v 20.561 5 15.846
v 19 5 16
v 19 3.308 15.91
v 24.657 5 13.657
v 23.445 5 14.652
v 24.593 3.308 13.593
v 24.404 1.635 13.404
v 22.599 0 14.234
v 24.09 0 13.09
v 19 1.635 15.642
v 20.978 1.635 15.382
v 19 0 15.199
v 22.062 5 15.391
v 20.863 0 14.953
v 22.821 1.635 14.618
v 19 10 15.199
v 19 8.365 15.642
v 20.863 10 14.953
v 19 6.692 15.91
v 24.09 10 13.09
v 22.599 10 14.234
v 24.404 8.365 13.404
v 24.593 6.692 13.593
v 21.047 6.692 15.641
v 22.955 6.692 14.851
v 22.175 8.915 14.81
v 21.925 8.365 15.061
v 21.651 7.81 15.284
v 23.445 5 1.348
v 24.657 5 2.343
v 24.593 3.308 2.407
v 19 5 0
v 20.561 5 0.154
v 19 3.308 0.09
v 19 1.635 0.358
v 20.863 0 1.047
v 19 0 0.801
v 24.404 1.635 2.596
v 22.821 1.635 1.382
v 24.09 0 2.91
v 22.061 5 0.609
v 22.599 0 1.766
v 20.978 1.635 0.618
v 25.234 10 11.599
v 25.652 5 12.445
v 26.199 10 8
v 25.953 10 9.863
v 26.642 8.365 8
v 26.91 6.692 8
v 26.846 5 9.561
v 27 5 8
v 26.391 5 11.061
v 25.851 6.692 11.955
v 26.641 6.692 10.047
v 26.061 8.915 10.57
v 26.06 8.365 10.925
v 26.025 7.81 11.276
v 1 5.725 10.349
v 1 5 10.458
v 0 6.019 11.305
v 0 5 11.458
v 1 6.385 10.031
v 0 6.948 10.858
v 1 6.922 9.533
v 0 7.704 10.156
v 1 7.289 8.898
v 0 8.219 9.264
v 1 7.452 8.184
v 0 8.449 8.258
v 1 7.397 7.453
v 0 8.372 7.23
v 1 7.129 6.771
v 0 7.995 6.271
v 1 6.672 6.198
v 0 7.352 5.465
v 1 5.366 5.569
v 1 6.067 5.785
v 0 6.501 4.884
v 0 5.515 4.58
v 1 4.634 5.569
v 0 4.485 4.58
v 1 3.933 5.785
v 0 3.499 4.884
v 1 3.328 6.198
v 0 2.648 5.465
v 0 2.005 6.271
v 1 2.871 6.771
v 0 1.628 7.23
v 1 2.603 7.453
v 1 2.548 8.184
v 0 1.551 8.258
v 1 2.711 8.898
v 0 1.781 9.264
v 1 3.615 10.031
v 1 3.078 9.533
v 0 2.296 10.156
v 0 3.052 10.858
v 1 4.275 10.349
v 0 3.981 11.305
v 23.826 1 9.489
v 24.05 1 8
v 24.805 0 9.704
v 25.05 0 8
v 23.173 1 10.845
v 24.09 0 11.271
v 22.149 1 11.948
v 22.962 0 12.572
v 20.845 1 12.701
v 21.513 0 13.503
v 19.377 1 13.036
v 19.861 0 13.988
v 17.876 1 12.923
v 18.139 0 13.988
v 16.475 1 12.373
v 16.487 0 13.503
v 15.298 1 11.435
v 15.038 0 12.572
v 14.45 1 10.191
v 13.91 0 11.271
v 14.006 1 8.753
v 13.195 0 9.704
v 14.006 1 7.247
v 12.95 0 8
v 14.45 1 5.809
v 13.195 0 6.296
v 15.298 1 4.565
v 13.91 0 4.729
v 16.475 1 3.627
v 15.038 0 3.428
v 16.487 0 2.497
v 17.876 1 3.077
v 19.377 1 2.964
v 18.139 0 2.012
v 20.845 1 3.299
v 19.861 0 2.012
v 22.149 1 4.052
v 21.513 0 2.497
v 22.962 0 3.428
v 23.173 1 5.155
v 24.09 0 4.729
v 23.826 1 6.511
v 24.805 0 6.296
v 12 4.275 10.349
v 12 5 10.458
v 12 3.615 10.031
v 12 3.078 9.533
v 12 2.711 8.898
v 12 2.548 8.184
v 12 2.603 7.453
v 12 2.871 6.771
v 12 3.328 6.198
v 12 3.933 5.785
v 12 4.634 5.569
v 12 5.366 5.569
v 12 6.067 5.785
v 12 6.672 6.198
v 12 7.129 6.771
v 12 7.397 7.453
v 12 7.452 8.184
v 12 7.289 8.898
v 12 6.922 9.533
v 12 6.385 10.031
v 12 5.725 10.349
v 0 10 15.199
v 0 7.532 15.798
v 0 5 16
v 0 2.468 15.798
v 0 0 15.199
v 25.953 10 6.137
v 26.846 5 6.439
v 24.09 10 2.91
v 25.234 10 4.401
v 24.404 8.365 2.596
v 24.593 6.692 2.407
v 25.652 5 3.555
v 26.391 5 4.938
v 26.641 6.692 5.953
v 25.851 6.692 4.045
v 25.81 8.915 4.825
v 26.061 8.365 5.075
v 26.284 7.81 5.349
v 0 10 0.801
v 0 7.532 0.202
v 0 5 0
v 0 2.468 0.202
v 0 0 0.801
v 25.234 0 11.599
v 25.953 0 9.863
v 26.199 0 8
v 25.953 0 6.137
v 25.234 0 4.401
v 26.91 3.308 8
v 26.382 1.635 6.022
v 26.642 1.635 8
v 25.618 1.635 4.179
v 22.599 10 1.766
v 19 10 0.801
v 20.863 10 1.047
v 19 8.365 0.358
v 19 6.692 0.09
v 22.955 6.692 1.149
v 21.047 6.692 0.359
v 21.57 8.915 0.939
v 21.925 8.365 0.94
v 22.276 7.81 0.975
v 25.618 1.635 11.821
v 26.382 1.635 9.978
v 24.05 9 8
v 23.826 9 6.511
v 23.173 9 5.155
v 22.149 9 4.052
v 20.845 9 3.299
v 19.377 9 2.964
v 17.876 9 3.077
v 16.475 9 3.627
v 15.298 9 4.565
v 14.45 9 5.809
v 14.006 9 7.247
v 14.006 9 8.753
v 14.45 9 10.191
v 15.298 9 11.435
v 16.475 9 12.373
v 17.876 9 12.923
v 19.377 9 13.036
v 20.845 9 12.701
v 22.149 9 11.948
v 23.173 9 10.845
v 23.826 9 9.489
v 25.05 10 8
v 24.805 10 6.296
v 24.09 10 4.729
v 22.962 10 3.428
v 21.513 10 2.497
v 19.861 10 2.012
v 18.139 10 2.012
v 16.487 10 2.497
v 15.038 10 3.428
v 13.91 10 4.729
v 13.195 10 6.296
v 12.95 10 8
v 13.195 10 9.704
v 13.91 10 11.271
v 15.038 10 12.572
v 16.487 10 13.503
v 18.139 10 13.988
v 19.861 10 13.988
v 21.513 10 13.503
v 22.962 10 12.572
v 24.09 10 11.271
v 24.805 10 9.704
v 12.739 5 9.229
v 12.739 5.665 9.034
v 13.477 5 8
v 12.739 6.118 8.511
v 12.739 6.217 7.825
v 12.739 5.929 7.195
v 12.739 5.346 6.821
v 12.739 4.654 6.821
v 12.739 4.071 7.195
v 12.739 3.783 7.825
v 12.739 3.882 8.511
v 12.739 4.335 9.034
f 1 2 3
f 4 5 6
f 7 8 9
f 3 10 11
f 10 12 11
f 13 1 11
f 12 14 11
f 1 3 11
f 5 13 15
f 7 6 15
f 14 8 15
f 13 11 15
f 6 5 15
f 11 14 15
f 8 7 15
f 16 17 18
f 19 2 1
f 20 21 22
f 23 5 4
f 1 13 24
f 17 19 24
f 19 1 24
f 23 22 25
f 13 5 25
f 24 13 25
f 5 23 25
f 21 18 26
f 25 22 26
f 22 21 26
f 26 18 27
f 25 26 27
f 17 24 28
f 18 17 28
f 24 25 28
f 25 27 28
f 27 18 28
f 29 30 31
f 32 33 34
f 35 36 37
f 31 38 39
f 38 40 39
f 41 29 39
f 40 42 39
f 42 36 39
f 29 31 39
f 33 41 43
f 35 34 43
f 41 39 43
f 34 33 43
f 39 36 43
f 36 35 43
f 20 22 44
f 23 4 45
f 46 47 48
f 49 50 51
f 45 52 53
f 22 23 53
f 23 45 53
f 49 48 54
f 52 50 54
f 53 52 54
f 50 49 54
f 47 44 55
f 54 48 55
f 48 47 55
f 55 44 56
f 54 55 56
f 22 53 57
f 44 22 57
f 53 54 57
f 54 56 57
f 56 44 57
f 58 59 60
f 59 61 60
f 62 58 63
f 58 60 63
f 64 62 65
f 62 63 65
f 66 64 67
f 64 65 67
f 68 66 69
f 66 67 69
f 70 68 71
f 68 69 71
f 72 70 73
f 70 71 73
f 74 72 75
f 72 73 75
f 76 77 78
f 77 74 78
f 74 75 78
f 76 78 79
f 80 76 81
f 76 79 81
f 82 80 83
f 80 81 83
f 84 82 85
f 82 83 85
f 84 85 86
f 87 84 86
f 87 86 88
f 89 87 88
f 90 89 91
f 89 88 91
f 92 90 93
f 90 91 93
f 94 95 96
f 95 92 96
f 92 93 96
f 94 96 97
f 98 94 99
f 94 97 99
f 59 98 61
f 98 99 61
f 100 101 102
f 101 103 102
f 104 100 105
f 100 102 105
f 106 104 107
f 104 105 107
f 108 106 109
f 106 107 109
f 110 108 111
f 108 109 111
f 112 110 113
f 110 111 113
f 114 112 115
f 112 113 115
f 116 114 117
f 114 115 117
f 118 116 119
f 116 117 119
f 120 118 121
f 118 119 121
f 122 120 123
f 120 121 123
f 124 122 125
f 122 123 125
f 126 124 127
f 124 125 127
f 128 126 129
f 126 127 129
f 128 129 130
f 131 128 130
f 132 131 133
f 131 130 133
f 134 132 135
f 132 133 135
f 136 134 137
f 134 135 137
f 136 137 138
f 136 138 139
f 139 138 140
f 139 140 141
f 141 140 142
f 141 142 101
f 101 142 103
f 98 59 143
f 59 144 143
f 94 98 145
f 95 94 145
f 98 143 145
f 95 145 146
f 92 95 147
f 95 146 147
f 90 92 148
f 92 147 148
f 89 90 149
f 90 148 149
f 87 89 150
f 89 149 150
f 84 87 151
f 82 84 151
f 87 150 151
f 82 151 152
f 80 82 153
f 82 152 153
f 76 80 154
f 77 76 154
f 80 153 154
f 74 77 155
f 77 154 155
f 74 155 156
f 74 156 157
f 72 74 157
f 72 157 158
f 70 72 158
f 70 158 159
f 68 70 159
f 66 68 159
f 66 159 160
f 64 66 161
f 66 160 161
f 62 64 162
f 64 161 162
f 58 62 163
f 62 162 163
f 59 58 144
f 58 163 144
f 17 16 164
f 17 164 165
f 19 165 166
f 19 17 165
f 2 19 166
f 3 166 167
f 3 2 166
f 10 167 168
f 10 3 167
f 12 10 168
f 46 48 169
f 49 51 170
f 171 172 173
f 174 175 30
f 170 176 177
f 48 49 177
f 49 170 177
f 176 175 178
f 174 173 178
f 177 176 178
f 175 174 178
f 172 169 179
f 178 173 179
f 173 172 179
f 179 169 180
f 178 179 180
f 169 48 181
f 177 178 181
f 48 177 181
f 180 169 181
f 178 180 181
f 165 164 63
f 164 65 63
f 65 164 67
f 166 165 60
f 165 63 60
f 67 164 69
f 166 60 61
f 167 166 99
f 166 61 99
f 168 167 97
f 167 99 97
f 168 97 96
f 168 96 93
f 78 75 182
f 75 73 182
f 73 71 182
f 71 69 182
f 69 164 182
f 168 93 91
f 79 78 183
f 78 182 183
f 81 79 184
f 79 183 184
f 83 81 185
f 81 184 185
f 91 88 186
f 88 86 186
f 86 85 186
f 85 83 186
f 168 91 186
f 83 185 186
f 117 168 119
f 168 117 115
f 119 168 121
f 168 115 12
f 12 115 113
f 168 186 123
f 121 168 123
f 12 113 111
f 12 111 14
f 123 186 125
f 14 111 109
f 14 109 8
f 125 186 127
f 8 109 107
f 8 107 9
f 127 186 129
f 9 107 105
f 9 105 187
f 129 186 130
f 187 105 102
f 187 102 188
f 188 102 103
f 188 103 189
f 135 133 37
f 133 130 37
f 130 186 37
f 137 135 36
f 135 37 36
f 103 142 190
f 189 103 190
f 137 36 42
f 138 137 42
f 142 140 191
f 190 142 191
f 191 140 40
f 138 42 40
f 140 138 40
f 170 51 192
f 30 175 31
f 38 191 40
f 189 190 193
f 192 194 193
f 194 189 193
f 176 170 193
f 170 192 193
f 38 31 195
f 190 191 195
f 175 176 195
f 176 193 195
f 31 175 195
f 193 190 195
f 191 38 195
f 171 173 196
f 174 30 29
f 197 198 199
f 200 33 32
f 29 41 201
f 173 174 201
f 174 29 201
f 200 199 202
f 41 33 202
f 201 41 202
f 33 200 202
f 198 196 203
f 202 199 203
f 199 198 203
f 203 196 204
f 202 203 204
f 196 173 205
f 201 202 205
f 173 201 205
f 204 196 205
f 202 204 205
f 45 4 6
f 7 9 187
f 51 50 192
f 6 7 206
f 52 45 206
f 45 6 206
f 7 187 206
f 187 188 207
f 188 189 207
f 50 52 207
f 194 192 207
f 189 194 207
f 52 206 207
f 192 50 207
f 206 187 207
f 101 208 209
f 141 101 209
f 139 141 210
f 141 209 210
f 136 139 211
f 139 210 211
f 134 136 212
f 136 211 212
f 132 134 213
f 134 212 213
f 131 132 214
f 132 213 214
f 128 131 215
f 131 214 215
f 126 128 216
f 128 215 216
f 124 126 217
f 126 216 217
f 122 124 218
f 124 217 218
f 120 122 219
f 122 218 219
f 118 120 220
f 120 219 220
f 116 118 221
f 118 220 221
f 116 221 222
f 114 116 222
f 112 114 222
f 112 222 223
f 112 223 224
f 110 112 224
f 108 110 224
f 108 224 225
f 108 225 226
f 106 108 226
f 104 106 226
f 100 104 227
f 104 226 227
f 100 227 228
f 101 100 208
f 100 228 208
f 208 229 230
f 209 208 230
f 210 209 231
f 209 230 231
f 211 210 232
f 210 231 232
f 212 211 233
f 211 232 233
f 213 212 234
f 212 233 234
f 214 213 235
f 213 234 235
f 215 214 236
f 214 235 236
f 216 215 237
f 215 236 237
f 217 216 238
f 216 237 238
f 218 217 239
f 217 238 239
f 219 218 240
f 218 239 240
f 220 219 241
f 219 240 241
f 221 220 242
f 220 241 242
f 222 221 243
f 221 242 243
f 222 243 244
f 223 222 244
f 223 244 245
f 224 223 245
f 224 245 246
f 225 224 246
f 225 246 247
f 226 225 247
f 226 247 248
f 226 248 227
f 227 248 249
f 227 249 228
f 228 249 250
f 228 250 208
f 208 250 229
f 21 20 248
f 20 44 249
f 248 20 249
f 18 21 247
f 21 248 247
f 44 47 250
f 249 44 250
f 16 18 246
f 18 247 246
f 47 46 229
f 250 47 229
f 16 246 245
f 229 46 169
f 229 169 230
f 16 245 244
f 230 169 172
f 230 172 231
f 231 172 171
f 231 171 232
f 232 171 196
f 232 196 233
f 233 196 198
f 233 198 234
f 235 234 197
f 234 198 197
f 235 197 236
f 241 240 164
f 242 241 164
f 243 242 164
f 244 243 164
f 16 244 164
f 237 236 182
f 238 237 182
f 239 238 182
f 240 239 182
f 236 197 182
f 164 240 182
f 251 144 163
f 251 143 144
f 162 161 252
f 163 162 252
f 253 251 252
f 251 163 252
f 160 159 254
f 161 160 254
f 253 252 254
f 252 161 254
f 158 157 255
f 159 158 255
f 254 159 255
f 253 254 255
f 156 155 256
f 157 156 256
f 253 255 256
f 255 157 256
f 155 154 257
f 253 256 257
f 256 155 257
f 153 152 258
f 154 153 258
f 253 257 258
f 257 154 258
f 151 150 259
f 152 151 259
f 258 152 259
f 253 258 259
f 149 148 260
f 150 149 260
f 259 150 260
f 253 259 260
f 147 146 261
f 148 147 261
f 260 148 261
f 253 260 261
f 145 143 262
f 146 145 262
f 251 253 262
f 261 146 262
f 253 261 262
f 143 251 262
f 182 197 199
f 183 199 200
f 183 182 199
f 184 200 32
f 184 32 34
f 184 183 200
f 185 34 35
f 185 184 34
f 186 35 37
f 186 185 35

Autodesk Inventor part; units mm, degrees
ref_plane "YZ Plane" through (0, 0, 0) normal (1, 0, 0) x (0, 1, 0)
ref_plane "XZ Plane" through (0, 0, 0) normal (0, 1, 0) x (-1, 0, 0)
ref_plane "XY Plane" through (0, 0, 0) normal (0, 0, 1) x (1, 0, 0)
sketch "Sketch1" plane through (0, 0, 0) normal (0, 0, 1) x (1, 0, 0)
  line L0 (0, 0) -> (27, 0)
  line L1 (27, 0) -> (27, 10)
  line L2 (27, 10) -> (0, 10)
  line L3 (0, 10) -> (0, 0)
  dimension "d0" = 27
  dimension "d1" = 10
extrude "Extrusion1" add sketch "Sketch1" along normal blind 16
fillet "Fillet1" radius 8 2 edges at (27, 5, 16) (27, 5, 0)
sketch "Sketch2" plane through (0, 10, 16) normal (0, 1, 0) x (1, 0, 0)
  circle A0 centre (19, 8) radius 5.05
  arc A1 (19, 0) -> (19, 16) centre (19, 8) ccw projected
  point P0 (0, 16)
  dimension "d5" = 10.1
extrude "Extrusion2" cut sketch "Sketch2" against normal through all
sketch "Sketch3" plane through (0, 0, 0) normal (-1, 0, 0) x (0, 0, 1)
  line L0 (0, 0) -> (16, 10) construction
  point P0 (8, 5)
  point P1 (8, 5)
hole "Hole1" at (0, 5, 8) direction (1, 0, 0) diameter 4.917 depth 12 tip angle 118
sketch "Sketch4" plane through (0, 0, 0) normal (-1, 0, 0) x (0, 0, 1)
  line L0 (0, 0) -> (16, 0) projected
  arc A0 (15.1987, 0) -> (15.1987, 10) centre (0, 5) ccw
  line L1 (0, 10) -> (16, 10) projected
  line L2 (16, 10) -> (16, 0) projected
  point P0 (16, 5)
  dimension "d15" = 16
sketch3d "3D Sketch1"
  line L0 (0, 10, 16) -> (19, 10, 16)
  arc A0 (19, 10, 0) -> (24.6569, 10, 2.3431) centre (19, 10, 8) ccw
  arc A1 (24.6569, 10, 2.3431) -> (27, 10, 8) centre (19, 10, 8) ccw
  arc A2 (27, 10, 8) -> (24.6569, 10, 13.6569) centre (19, 10, 8) ccw
  arc A3 (24.6569, 10, 13.6569) -> (19, 10, 16) centre (19, 10, 8) ccw
  line L1 (19, 10, 0) -> (0, 10, 0)
sweep "Sweep1" cut profiles "Sketch4" path "3D Sketch1"
chamfer "Chamfer1" distance 1 angle 45 3 edges at (13.95, 10, 8) (13.95, 0, 8) (0, 5, 5.5415)
properties part number "GMW-6-1 eye M6x1" material "Steel, Alloy"
